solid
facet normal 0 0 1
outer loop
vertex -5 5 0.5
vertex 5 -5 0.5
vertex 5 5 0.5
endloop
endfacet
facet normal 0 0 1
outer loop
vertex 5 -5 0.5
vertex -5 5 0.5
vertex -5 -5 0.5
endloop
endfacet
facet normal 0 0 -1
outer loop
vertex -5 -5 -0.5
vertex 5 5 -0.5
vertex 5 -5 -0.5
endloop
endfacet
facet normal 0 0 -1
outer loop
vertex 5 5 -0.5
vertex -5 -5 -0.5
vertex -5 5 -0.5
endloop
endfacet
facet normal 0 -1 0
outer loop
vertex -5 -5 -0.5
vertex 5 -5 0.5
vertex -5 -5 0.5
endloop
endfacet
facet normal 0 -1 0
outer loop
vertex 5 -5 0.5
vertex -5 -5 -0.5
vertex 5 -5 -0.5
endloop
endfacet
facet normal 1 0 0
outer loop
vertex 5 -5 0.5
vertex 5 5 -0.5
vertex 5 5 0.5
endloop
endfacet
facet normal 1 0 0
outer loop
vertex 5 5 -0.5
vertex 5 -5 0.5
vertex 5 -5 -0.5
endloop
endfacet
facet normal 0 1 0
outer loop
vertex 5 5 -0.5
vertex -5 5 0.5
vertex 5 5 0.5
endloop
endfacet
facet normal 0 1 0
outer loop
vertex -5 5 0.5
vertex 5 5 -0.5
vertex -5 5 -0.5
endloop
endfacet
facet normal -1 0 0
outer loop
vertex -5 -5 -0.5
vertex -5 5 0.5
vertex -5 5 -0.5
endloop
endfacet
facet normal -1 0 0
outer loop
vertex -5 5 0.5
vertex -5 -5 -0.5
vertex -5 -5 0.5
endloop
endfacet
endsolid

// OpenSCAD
//Optimal Settings for 3D Printing
$fa = 1;
$fs = 0.4;

//NEEDS MAX WIDTH AND HEIGHT
function overlap() = 0.001;

//Create a base for the model
// ** REMOVE COLOR BEFORE EXPORTING **
color("#808080")
    cube([10,10,1], center=true);

module createLines(baseLength, baseWidth, lineSpacing, lineWidth, lineHeight){
    for(i=[0:3]){
        rotate([0,0,i*90])
        translate([0, baseWidth-lineSpacing, lineHeight-overlap()]);
            cube([baseLength, lineWidth, lineHeight], center=true);
    }   
}

module constructGrid(baseLength, baseWidth){
    if(linePos != [0,0,0]){
        echo("Complete");
    }
    else{
        createLines();
    }
}
